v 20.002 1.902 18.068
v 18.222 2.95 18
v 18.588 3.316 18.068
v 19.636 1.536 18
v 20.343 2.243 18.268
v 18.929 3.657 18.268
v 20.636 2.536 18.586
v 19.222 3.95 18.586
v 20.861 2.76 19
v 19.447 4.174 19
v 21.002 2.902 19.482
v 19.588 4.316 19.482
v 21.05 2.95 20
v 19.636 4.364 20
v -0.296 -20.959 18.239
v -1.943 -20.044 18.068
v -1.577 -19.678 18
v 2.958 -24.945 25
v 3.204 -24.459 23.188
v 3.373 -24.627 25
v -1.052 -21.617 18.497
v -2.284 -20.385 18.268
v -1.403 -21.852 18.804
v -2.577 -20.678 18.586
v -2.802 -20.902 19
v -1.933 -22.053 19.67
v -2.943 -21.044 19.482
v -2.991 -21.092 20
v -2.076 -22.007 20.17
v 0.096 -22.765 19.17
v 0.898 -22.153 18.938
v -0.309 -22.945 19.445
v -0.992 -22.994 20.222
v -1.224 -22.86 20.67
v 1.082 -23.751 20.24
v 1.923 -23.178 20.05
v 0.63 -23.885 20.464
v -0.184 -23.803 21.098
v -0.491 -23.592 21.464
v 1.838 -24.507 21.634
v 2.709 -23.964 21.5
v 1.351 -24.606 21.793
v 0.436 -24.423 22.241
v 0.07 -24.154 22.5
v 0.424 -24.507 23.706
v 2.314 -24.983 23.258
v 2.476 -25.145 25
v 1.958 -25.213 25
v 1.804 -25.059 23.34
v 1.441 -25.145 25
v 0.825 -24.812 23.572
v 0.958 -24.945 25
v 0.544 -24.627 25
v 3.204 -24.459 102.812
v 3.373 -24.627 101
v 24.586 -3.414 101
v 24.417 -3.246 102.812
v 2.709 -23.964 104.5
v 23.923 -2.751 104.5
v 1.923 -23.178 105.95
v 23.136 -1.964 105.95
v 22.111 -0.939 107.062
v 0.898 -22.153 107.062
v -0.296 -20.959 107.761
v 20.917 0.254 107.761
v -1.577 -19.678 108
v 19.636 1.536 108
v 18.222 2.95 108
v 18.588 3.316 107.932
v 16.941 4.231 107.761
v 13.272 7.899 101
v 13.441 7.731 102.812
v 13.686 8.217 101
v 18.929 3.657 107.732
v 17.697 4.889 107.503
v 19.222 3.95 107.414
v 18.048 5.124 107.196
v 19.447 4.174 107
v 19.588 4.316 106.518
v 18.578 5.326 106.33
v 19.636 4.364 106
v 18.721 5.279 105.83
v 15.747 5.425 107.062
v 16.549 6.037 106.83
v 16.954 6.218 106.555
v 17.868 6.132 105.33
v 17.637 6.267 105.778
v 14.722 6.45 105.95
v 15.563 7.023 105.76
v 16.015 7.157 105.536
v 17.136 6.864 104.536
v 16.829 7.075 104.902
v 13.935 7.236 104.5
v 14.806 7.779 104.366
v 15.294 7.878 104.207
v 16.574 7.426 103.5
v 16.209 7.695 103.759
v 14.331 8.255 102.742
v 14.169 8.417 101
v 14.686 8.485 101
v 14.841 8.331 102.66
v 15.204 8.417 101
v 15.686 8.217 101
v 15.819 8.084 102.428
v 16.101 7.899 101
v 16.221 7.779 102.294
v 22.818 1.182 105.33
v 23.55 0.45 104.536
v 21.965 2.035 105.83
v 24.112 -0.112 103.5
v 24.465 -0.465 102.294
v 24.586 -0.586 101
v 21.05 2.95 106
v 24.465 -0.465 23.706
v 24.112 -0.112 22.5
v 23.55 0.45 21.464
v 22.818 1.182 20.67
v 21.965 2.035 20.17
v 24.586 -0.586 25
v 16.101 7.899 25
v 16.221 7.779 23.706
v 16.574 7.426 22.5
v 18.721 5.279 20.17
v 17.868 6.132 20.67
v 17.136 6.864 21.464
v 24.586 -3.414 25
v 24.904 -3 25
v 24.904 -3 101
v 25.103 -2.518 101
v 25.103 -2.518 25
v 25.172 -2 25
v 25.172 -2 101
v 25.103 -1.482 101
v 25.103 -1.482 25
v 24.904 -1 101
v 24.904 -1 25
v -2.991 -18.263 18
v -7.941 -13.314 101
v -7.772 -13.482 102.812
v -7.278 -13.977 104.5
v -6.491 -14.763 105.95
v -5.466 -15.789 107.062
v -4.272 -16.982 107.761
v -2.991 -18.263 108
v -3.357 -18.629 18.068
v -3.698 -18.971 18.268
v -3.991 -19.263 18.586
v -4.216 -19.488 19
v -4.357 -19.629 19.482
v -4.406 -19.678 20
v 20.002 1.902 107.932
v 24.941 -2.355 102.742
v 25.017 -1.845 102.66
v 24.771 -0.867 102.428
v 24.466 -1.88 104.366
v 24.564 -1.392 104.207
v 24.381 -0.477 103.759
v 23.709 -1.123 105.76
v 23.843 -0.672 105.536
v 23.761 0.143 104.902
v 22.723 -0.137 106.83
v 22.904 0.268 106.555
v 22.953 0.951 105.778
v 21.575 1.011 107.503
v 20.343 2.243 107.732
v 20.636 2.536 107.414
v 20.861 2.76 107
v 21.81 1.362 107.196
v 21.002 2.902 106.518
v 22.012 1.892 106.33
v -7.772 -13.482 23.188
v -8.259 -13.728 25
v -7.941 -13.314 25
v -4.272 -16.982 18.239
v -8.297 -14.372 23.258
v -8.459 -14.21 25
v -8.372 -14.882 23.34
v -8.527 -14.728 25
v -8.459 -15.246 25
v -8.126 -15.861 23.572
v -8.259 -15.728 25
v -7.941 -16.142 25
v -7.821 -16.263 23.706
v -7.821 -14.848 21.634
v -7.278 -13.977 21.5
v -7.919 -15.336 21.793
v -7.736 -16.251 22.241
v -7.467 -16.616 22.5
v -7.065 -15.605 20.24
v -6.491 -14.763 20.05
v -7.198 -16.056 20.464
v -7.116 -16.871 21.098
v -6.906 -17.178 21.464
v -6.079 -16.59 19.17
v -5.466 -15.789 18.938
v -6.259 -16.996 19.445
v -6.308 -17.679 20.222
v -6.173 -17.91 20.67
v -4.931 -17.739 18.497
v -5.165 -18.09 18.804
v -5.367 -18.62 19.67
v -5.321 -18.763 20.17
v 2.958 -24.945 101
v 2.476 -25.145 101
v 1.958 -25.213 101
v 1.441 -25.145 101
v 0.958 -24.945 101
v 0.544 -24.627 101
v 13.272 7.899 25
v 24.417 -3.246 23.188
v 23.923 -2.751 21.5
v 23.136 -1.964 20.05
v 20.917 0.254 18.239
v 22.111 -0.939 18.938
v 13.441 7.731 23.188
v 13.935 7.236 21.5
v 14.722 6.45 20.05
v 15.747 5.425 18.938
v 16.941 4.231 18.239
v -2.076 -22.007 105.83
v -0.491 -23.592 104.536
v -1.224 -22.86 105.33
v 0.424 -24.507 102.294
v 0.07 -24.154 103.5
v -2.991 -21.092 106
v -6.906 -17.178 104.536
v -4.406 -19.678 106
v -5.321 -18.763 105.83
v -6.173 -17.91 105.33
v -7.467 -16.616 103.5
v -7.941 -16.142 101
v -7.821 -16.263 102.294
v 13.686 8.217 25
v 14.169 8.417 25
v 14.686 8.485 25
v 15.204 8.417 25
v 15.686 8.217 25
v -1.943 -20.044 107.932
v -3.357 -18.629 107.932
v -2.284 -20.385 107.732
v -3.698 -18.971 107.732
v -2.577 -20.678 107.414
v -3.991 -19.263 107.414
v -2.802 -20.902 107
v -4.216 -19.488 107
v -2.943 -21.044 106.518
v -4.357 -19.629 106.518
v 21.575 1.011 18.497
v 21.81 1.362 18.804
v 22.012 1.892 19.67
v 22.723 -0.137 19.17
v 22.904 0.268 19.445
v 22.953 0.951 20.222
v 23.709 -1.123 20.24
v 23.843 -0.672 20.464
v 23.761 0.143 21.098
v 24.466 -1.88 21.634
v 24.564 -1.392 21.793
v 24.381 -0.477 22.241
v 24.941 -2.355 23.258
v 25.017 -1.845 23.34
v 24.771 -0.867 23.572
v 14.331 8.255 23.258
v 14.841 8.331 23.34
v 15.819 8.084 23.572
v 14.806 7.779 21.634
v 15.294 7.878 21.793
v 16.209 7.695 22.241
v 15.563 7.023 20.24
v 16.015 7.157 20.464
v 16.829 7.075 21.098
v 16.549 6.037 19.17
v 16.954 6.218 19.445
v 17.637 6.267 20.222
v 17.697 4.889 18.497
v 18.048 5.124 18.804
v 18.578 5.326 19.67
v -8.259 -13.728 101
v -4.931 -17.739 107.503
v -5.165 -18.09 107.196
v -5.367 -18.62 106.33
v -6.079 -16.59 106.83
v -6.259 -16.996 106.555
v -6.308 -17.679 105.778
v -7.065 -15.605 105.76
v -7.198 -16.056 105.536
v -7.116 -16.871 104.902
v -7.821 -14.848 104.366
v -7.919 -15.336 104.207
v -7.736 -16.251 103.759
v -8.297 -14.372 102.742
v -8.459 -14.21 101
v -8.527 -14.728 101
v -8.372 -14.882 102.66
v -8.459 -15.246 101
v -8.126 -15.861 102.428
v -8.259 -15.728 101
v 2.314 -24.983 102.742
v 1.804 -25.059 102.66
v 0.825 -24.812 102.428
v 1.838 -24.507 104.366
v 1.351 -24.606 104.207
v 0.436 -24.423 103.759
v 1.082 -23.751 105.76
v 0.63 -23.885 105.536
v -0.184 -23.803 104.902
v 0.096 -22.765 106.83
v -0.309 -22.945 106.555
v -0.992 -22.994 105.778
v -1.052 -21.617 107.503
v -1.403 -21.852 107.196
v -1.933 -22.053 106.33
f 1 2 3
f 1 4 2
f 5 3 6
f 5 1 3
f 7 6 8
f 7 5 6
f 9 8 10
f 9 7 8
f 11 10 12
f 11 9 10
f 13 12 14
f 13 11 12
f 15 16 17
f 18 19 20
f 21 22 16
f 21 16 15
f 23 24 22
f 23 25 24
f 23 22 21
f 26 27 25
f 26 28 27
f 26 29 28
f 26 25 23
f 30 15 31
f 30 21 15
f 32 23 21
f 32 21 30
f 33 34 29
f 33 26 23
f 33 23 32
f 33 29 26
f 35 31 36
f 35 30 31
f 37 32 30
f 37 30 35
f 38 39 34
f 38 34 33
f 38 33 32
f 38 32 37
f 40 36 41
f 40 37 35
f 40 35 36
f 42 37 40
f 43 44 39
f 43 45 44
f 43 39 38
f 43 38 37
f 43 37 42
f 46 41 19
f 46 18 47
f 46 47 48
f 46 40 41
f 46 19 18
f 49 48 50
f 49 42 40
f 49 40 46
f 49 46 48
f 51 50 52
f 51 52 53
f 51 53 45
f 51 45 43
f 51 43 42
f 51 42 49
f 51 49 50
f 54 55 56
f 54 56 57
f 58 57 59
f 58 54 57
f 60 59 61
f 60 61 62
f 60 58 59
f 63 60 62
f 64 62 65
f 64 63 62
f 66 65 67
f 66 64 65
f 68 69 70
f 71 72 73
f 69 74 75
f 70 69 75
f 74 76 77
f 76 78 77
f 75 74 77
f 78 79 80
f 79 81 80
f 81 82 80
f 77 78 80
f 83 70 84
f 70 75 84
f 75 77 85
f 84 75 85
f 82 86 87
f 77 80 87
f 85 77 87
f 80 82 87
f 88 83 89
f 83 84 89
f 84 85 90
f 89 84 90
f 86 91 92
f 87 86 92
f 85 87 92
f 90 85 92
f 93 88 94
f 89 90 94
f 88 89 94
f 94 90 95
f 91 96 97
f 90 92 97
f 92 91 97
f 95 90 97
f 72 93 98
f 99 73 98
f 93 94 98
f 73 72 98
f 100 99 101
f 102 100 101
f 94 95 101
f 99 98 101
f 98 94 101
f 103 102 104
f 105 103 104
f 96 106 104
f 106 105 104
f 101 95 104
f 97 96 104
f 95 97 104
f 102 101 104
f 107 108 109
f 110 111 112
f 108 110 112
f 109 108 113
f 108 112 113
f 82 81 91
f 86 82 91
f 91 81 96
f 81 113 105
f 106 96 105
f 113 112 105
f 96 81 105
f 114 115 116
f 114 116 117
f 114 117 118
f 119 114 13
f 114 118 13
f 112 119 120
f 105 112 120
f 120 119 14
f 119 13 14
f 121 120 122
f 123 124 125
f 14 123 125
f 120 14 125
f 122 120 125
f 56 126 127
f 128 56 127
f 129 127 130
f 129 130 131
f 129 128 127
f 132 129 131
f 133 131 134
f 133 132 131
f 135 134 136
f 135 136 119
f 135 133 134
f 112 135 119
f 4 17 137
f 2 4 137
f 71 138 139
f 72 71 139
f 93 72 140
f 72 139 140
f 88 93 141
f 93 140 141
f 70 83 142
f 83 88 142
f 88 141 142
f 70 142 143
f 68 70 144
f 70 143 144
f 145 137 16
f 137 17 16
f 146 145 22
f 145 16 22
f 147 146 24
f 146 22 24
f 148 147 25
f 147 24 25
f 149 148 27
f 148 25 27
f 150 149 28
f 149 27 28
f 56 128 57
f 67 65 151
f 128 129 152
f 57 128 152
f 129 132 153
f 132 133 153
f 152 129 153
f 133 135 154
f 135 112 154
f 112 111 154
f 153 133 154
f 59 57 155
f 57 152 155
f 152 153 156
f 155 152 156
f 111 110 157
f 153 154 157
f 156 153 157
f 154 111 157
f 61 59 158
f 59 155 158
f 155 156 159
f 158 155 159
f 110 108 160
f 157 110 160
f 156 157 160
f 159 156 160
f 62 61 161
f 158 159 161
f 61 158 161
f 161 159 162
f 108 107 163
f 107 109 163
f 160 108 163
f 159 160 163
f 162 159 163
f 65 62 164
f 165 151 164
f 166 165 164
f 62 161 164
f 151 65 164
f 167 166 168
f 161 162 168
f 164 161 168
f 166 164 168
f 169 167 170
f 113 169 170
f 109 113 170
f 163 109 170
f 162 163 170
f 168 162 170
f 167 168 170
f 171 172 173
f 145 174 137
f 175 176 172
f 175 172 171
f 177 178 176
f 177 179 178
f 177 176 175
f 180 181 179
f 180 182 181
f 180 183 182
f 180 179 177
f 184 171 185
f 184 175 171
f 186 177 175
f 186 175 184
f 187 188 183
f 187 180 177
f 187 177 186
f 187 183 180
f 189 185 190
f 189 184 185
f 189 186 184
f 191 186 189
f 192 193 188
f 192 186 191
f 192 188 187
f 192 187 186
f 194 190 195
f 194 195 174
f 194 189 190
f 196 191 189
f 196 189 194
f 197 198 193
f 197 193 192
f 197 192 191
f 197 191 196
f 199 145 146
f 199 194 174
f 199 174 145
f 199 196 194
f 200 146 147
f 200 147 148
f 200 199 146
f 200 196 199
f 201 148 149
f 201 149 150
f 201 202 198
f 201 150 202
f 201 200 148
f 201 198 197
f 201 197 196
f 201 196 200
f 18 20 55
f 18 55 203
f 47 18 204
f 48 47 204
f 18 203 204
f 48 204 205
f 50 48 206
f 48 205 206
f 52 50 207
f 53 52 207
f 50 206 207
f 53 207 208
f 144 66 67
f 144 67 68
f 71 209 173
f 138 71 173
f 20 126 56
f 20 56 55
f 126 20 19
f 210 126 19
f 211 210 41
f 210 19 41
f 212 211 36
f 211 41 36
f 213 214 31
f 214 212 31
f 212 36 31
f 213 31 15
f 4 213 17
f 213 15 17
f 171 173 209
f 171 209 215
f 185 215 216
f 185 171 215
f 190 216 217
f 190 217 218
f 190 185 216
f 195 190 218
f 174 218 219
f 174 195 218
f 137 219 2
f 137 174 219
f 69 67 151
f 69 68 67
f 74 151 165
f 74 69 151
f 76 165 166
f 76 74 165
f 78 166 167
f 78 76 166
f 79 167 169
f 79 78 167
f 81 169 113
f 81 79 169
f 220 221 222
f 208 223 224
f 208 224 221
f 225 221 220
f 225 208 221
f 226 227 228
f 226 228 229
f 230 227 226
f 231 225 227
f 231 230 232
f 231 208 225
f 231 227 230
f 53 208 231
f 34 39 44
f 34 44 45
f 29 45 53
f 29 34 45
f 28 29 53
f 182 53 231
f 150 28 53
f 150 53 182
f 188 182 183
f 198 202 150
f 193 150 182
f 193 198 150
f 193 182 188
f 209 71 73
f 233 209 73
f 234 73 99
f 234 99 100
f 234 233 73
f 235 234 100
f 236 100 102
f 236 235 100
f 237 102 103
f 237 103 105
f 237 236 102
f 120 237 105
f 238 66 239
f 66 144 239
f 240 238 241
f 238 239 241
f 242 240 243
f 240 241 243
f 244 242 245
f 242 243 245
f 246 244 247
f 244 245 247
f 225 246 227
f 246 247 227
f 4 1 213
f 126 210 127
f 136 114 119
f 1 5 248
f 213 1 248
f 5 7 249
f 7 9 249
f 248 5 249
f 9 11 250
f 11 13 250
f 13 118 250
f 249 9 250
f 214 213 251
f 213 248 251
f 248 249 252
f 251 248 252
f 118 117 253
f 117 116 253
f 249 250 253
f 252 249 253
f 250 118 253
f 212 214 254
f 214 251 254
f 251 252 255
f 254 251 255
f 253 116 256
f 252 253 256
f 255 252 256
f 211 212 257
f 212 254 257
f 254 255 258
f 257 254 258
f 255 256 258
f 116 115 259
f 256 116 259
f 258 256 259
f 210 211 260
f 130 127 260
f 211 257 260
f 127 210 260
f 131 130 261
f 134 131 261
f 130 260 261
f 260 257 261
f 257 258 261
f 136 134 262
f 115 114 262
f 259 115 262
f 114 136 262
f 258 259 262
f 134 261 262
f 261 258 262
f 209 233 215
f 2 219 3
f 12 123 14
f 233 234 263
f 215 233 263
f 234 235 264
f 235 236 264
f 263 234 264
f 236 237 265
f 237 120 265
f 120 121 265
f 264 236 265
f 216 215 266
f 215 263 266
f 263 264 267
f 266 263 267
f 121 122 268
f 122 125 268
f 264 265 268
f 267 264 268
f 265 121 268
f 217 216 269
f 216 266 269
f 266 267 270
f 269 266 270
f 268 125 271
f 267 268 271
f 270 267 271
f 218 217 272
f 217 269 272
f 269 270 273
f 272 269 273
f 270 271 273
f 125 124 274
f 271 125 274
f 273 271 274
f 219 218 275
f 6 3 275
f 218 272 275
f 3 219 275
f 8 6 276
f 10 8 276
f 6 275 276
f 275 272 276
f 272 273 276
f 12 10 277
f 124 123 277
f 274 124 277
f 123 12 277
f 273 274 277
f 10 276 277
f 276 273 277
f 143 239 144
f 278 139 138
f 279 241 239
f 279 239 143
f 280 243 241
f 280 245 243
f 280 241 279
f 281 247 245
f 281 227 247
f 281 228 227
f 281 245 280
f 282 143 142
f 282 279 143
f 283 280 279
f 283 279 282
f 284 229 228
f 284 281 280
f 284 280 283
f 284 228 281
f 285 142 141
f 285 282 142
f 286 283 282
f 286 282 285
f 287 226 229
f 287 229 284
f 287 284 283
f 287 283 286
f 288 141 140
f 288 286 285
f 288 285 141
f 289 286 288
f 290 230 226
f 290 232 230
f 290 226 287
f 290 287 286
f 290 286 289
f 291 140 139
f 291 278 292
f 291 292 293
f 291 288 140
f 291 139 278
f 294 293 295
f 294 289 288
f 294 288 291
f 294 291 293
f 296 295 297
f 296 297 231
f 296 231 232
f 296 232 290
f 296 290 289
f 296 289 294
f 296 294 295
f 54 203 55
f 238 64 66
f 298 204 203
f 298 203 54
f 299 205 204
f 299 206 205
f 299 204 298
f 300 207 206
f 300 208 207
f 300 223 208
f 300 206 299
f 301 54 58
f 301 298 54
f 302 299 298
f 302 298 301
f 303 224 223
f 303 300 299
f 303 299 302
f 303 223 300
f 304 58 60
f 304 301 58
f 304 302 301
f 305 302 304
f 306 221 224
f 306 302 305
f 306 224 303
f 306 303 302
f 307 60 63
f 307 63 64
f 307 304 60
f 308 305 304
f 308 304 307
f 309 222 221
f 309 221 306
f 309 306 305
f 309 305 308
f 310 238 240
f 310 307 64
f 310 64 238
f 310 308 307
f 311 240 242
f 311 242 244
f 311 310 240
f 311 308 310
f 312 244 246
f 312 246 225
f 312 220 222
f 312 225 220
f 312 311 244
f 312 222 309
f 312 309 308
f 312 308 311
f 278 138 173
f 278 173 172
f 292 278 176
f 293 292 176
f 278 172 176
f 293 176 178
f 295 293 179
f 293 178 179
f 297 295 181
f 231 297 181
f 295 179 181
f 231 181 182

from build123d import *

# Parameters (mm, degrees)
BOX016_W                  = 16
BOX016_H                  = 34
BOX016_DEPTH              = 90
BOX016_PLACEMENT_ANGLE    = 45
FILLET_R                  = 7
FILLET001_R               = 2
FILLET001_PLACEMENT_ANGLE = 90


with BuildPart() as part:
    # Box016 → Box016 (new body)
    with BuildSketch(Plane.XY):
        with Locations((8, 17)):
            Rectangle(BOX016_W, BOX016_H)
    extrude(amount=BOX016_DEPTH)


with BuildPart() as part_1:
    # Box016 placement: moved
    add(part.part.moved(Location((0, 0, 180))).rotate(Axis((0, 0, 180), (0, 0, 1)), BOX016_PLACEMENT_ANGLE))

    # Fillet
    fillet_edges = [part_1.edges().sort_by_distance(p)[0] for p in [
        (-12.020815, 12.020815, 270),
        (-12.020815, 12.020815, 180),
        (-0.707107, 23.334524, 270),
        (-0.707107, 23.334524, 180),
    ]]
    fillet(fillet_edges, radius=FILLET_R)


with BuildPart() as part_2:
    # Fillet placement: moved
    add(part_1.part.moved(Location((-2, -26, -162))))

    # Fillet001
    fillet001_edges = [part_2.edges().sort_by_distance(p)[0] for p in [
        (-2, -26, 63),
        (-26.041631, -1.958369, 63),
    ]]
    fillet(fillet001_edges, radius=FILLET001_R)


with BuildPart() as part_3:
    # Fillet001 placement: moved
    add(part_2.part.rotate(Axis((0, 0, 0), (0, 0, 1)), FILLET001_PLACEMENT_ANGLE))


solid = part_3.part
